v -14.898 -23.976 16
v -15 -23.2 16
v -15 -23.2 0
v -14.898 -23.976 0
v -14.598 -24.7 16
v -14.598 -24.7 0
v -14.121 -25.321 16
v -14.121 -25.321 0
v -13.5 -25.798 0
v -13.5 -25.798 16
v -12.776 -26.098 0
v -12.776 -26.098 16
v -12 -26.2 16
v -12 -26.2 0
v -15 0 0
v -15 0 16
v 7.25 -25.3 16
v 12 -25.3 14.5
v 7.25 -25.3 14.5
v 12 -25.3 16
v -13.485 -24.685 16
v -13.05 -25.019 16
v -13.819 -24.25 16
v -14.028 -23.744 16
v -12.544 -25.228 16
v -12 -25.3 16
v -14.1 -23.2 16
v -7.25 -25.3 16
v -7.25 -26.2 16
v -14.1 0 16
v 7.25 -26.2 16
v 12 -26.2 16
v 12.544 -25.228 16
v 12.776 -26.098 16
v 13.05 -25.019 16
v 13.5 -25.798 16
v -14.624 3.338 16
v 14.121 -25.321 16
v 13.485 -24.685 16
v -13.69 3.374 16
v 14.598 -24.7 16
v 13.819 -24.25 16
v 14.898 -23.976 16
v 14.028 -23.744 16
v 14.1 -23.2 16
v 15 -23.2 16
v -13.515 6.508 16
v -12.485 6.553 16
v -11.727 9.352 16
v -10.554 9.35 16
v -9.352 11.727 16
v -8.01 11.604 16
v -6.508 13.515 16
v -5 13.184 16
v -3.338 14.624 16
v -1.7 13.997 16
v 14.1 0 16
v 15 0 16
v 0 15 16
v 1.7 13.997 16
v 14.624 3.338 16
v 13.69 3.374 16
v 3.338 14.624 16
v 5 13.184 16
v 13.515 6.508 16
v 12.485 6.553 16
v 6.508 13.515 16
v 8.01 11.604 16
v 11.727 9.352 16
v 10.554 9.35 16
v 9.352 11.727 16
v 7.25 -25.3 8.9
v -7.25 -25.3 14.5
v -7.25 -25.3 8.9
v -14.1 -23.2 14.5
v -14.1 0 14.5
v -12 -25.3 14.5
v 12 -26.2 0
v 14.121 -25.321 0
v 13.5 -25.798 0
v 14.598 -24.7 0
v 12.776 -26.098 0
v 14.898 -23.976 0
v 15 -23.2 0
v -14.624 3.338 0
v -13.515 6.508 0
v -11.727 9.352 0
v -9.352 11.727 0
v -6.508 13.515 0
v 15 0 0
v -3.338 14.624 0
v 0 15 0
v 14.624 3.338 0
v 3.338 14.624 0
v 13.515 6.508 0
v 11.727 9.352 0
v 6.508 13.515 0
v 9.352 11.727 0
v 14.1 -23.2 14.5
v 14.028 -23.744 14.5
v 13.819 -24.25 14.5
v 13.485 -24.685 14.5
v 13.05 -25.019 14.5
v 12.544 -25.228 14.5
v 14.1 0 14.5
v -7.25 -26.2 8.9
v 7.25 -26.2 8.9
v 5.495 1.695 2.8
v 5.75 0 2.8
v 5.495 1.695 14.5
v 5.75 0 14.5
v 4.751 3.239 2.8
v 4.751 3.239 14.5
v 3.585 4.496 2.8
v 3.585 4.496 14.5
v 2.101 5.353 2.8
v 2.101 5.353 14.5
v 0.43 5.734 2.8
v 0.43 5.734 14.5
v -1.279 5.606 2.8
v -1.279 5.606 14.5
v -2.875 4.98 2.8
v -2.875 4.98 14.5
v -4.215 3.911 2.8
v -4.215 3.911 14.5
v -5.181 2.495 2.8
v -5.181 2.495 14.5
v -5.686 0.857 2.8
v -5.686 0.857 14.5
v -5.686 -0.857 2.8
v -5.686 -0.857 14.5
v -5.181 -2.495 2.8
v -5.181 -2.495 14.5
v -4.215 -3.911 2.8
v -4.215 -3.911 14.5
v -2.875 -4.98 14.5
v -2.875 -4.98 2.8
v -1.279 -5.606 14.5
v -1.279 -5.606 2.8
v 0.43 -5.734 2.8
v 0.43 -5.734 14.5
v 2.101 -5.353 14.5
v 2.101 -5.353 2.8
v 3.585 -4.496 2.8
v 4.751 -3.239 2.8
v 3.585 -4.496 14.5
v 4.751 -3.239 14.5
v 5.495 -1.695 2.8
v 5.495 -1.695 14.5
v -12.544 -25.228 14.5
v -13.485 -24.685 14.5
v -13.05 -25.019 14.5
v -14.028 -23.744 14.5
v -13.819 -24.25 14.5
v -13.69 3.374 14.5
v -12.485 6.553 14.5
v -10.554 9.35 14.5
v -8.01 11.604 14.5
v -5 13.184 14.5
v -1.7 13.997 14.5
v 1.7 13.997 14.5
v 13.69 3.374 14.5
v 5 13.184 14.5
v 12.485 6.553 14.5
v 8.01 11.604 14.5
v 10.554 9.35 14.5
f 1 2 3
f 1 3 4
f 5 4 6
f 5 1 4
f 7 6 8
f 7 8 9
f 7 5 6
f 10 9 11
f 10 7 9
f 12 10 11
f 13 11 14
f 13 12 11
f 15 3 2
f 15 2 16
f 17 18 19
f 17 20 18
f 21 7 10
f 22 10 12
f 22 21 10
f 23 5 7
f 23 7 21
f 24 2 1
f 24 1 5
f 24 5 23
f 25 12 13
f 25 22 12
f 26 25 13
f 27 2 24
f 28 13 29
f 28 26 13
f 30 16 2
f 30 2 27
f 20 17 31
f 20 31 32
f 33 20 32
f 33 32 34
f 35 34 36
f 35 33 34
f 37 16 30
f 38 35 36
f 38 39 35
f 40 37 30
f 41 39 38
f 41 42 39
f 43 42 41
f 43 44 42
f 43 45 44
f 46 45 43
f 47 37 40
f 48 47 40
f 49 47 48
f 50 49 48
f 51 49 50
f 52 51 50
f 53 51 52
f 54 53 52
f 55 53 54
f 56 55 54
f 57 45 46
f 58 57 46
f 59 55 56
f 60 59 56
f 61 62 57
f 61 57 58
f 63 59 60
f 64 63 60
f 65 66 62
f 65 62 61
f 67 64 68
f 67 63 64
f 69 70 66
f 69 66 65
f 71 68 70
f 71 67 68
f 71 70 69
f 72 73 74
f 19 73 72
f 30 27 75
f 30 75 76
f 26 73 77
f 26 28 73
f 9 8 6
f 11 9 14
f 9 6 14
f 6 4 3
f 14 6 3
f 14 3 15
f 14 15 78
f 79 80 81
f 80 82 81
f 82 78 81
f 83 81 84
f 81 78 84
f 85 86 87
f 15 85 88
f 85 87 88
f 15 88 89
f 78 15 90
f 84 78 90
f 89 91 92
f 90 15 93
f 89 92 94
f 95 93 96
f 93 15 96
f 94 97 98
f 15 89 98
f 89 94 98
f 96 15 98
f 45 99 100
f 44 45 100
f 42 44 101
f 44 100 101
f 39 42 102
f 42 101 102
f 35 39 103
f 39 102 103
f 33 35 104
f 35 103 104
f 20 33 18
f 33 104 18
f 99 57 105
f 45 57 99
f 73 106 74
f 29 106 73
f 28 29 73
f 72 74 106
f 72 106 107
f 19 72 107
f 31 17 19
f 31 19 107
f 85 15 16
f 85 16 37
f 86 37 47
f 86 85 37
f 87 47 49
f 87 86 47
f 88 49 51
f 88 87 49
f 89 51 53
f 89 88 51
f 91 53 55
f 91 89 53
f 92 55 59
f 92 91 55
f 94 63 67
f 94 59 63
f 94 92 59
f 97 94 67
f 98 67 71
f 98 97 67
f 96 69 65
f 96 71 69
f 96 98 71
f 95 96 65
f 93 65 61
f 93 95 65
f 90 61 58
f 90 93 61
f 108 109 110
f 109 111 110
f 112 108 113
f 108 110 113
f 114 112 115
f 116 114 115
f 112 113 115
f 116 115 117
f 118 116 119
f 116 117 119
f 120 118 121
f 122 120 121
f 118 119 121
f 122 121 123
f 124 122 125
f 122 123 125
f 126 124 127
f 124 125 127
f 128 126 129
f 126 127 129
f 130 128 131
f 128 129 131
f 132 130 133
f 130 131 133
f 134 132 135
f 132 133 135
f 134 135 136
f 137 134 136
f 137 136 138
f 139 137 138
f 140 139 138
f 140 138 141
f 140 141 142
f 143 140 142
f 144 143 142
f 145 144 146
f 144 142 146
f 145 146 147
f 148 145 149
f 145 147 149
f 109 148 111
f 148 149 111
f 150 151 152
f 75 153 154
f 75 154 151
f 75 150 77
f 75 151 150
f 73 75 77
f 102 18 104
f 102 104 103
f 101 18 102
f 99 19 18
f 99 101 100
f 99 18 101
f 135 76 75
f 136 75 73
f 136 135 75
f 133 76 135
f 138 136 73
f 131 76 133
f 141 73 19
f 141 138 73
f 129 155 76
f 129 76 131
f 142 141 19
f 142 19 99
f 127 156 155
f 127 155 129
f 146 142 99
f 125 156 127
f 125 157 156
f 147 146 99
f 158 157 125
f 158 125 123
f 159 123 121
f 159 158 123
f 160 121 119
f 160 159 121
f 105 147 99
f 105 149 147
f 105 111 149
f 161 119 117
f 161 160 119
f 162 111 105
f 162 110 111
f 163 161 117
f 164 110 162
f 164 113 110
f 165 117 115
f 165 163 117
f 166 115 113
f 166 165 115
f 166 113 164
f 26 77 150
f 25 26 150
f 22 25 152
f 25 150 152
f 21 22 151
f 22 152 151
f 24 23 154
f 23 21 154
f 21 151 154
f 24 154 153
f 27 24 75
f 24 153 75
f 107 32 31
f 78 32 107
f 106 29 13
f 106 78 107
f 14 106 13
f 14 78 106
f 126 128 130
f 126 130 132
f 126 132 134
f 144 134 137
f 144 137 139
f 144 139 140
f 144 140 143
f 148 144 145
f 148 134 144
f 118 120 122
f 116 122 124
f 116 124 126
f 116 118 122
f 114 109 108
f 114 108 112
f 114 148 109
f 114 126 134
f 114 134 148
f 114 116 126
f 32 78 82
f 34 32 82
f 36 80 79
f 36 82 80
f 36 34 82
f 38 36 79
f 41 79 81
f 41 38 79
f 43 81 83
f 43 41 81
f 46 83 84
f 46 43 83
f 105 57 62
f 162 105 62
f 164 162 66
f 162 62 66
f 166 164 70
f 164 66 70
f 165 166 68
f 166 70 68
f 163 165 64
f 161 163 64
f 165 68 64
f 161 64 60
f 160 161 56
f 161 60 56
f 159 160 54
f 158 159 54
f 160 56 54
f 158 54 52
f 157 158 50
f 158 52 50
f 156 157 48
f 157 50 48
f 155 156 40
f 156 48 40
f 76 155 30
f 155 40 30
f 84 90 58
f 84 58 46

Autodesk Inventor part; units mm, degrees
ref_plane "YZ Plane" through (0, 0, 0) normal (1, 0, 0) x (0, 1, 0)
ref_plane "XZ Plane" through (0, 0, 0) normal (0, 1, 0) x (-1, 0, 0)
ref_plane "XY Plane" through (0, 0, 0) normal (0, 0, 1) x (1, 0, 0)
sketch "スケッチ1" plane through (0, 0, 0) normal (0, 0, 1) x (1, 0, 0)
  line L0 (-15, 0) -> (15, 0)
  line L1 (15, 0) -> (15, -26.2)
  line L2 (15, -26.2) -> (-15, -26.2)
  line L3 (-15, -26.2) -> (-15, 0)
  circle A0 centre (0, 0) radius 15
  dimension "d0" = 30
  dimension "d1" = 15
  dimension "d2" = 26.2
  dimension "d3" = 0
extrude "押し出し1" add sketch "スケッチ1" along normal blind 16
sketch "スケッチ2" plane through (0, 0, 16) normal (0, 0, 1) x (1, 0, 0)
  arc A0 (15, 0) -> (-15, 0) centre (0, 0) ccw projected
  line L0 (-15, -26.2) -> (-15, 0) projected
  line L1 (15, -26.2) -> (-15, -26.2) projected
  line L2 (15, 0) -> (15, -26.2) projected
  line L3 (-14.1, 0) -> (14.1, 0)
  line L4 (14.1, 0) -> (14.1, -25.3)
  line L5 (14.1, -25.3) -> (-14.1, -25.3)
  line L6 (-14.1, -25.3) -> (-14.1, 0)
  circle A1 centre (0, 0) radius 14.1
  dimension "d6" = 0.9
  dimension "d7" = 0.9
  dimension "d8" = 0.9
extrude "押し出し2" cut sketch "スケッチ2" against normal blind 1.5 contours A1 L3 | A1 L4 L5 L6 | L3 A1
sketch "スケッチ3" plane through (0, 0, 14.5) normal (0, 0, 1) x (1, 0, 0)
  arc A0 (14.1, 0) -> (-14.1, 0) centre (0, 0) ccw projected
  circle A1 centre (0, 0) radius 5.75
  dimension "d11" = 11.5
extrude "押し出し3" cut sketch "スケッチ3" against normal blind 11.7
fillet "フィレット1" radius 3 2 edges at (15, -26.2, 8) (-15, -26.2, 8)
fillet "フィレット2" radius 2.1 2 edges at (-14.1, -25.3, 15.25) (14.1, -25.3, 15.25)
sketch "スケッチ4" plane through (0, 0, 16) normal (0, 0, 1) x (1, 0, 0)
  line L0 (12, -26.2) -> (-12, -26.2) projected
  arc A0 (15, 0) -> (-15, 0) centre (0, 0) ccw projected
  line L1 (-12, -25.3) -> (12, -25.3) projected
  line L2 (-7.25, -25.3) -> (7.25, -25.3)
  line L3 (7.25, -25.3) -> (7.25, -26.2)
  line L4 (7.25, -26.2) -> (-7.25, -26.2)
  line L5 (-7.25, -26.2) -> (-7.25, -25.3)
  dimension "d16" = 14.5
  dimension "d17" = 7.25
extrude "押し出し4" cut sketch "スケッチ4" against normal blind 7.1
equation "\"d1\" = 0.5 * d0"
equation "\"d7\" = d6"
equation "\"d8\" = d6"
equation "\"d17\" = 0.5 * d16"
properties part number "HEDS-5500_B"
